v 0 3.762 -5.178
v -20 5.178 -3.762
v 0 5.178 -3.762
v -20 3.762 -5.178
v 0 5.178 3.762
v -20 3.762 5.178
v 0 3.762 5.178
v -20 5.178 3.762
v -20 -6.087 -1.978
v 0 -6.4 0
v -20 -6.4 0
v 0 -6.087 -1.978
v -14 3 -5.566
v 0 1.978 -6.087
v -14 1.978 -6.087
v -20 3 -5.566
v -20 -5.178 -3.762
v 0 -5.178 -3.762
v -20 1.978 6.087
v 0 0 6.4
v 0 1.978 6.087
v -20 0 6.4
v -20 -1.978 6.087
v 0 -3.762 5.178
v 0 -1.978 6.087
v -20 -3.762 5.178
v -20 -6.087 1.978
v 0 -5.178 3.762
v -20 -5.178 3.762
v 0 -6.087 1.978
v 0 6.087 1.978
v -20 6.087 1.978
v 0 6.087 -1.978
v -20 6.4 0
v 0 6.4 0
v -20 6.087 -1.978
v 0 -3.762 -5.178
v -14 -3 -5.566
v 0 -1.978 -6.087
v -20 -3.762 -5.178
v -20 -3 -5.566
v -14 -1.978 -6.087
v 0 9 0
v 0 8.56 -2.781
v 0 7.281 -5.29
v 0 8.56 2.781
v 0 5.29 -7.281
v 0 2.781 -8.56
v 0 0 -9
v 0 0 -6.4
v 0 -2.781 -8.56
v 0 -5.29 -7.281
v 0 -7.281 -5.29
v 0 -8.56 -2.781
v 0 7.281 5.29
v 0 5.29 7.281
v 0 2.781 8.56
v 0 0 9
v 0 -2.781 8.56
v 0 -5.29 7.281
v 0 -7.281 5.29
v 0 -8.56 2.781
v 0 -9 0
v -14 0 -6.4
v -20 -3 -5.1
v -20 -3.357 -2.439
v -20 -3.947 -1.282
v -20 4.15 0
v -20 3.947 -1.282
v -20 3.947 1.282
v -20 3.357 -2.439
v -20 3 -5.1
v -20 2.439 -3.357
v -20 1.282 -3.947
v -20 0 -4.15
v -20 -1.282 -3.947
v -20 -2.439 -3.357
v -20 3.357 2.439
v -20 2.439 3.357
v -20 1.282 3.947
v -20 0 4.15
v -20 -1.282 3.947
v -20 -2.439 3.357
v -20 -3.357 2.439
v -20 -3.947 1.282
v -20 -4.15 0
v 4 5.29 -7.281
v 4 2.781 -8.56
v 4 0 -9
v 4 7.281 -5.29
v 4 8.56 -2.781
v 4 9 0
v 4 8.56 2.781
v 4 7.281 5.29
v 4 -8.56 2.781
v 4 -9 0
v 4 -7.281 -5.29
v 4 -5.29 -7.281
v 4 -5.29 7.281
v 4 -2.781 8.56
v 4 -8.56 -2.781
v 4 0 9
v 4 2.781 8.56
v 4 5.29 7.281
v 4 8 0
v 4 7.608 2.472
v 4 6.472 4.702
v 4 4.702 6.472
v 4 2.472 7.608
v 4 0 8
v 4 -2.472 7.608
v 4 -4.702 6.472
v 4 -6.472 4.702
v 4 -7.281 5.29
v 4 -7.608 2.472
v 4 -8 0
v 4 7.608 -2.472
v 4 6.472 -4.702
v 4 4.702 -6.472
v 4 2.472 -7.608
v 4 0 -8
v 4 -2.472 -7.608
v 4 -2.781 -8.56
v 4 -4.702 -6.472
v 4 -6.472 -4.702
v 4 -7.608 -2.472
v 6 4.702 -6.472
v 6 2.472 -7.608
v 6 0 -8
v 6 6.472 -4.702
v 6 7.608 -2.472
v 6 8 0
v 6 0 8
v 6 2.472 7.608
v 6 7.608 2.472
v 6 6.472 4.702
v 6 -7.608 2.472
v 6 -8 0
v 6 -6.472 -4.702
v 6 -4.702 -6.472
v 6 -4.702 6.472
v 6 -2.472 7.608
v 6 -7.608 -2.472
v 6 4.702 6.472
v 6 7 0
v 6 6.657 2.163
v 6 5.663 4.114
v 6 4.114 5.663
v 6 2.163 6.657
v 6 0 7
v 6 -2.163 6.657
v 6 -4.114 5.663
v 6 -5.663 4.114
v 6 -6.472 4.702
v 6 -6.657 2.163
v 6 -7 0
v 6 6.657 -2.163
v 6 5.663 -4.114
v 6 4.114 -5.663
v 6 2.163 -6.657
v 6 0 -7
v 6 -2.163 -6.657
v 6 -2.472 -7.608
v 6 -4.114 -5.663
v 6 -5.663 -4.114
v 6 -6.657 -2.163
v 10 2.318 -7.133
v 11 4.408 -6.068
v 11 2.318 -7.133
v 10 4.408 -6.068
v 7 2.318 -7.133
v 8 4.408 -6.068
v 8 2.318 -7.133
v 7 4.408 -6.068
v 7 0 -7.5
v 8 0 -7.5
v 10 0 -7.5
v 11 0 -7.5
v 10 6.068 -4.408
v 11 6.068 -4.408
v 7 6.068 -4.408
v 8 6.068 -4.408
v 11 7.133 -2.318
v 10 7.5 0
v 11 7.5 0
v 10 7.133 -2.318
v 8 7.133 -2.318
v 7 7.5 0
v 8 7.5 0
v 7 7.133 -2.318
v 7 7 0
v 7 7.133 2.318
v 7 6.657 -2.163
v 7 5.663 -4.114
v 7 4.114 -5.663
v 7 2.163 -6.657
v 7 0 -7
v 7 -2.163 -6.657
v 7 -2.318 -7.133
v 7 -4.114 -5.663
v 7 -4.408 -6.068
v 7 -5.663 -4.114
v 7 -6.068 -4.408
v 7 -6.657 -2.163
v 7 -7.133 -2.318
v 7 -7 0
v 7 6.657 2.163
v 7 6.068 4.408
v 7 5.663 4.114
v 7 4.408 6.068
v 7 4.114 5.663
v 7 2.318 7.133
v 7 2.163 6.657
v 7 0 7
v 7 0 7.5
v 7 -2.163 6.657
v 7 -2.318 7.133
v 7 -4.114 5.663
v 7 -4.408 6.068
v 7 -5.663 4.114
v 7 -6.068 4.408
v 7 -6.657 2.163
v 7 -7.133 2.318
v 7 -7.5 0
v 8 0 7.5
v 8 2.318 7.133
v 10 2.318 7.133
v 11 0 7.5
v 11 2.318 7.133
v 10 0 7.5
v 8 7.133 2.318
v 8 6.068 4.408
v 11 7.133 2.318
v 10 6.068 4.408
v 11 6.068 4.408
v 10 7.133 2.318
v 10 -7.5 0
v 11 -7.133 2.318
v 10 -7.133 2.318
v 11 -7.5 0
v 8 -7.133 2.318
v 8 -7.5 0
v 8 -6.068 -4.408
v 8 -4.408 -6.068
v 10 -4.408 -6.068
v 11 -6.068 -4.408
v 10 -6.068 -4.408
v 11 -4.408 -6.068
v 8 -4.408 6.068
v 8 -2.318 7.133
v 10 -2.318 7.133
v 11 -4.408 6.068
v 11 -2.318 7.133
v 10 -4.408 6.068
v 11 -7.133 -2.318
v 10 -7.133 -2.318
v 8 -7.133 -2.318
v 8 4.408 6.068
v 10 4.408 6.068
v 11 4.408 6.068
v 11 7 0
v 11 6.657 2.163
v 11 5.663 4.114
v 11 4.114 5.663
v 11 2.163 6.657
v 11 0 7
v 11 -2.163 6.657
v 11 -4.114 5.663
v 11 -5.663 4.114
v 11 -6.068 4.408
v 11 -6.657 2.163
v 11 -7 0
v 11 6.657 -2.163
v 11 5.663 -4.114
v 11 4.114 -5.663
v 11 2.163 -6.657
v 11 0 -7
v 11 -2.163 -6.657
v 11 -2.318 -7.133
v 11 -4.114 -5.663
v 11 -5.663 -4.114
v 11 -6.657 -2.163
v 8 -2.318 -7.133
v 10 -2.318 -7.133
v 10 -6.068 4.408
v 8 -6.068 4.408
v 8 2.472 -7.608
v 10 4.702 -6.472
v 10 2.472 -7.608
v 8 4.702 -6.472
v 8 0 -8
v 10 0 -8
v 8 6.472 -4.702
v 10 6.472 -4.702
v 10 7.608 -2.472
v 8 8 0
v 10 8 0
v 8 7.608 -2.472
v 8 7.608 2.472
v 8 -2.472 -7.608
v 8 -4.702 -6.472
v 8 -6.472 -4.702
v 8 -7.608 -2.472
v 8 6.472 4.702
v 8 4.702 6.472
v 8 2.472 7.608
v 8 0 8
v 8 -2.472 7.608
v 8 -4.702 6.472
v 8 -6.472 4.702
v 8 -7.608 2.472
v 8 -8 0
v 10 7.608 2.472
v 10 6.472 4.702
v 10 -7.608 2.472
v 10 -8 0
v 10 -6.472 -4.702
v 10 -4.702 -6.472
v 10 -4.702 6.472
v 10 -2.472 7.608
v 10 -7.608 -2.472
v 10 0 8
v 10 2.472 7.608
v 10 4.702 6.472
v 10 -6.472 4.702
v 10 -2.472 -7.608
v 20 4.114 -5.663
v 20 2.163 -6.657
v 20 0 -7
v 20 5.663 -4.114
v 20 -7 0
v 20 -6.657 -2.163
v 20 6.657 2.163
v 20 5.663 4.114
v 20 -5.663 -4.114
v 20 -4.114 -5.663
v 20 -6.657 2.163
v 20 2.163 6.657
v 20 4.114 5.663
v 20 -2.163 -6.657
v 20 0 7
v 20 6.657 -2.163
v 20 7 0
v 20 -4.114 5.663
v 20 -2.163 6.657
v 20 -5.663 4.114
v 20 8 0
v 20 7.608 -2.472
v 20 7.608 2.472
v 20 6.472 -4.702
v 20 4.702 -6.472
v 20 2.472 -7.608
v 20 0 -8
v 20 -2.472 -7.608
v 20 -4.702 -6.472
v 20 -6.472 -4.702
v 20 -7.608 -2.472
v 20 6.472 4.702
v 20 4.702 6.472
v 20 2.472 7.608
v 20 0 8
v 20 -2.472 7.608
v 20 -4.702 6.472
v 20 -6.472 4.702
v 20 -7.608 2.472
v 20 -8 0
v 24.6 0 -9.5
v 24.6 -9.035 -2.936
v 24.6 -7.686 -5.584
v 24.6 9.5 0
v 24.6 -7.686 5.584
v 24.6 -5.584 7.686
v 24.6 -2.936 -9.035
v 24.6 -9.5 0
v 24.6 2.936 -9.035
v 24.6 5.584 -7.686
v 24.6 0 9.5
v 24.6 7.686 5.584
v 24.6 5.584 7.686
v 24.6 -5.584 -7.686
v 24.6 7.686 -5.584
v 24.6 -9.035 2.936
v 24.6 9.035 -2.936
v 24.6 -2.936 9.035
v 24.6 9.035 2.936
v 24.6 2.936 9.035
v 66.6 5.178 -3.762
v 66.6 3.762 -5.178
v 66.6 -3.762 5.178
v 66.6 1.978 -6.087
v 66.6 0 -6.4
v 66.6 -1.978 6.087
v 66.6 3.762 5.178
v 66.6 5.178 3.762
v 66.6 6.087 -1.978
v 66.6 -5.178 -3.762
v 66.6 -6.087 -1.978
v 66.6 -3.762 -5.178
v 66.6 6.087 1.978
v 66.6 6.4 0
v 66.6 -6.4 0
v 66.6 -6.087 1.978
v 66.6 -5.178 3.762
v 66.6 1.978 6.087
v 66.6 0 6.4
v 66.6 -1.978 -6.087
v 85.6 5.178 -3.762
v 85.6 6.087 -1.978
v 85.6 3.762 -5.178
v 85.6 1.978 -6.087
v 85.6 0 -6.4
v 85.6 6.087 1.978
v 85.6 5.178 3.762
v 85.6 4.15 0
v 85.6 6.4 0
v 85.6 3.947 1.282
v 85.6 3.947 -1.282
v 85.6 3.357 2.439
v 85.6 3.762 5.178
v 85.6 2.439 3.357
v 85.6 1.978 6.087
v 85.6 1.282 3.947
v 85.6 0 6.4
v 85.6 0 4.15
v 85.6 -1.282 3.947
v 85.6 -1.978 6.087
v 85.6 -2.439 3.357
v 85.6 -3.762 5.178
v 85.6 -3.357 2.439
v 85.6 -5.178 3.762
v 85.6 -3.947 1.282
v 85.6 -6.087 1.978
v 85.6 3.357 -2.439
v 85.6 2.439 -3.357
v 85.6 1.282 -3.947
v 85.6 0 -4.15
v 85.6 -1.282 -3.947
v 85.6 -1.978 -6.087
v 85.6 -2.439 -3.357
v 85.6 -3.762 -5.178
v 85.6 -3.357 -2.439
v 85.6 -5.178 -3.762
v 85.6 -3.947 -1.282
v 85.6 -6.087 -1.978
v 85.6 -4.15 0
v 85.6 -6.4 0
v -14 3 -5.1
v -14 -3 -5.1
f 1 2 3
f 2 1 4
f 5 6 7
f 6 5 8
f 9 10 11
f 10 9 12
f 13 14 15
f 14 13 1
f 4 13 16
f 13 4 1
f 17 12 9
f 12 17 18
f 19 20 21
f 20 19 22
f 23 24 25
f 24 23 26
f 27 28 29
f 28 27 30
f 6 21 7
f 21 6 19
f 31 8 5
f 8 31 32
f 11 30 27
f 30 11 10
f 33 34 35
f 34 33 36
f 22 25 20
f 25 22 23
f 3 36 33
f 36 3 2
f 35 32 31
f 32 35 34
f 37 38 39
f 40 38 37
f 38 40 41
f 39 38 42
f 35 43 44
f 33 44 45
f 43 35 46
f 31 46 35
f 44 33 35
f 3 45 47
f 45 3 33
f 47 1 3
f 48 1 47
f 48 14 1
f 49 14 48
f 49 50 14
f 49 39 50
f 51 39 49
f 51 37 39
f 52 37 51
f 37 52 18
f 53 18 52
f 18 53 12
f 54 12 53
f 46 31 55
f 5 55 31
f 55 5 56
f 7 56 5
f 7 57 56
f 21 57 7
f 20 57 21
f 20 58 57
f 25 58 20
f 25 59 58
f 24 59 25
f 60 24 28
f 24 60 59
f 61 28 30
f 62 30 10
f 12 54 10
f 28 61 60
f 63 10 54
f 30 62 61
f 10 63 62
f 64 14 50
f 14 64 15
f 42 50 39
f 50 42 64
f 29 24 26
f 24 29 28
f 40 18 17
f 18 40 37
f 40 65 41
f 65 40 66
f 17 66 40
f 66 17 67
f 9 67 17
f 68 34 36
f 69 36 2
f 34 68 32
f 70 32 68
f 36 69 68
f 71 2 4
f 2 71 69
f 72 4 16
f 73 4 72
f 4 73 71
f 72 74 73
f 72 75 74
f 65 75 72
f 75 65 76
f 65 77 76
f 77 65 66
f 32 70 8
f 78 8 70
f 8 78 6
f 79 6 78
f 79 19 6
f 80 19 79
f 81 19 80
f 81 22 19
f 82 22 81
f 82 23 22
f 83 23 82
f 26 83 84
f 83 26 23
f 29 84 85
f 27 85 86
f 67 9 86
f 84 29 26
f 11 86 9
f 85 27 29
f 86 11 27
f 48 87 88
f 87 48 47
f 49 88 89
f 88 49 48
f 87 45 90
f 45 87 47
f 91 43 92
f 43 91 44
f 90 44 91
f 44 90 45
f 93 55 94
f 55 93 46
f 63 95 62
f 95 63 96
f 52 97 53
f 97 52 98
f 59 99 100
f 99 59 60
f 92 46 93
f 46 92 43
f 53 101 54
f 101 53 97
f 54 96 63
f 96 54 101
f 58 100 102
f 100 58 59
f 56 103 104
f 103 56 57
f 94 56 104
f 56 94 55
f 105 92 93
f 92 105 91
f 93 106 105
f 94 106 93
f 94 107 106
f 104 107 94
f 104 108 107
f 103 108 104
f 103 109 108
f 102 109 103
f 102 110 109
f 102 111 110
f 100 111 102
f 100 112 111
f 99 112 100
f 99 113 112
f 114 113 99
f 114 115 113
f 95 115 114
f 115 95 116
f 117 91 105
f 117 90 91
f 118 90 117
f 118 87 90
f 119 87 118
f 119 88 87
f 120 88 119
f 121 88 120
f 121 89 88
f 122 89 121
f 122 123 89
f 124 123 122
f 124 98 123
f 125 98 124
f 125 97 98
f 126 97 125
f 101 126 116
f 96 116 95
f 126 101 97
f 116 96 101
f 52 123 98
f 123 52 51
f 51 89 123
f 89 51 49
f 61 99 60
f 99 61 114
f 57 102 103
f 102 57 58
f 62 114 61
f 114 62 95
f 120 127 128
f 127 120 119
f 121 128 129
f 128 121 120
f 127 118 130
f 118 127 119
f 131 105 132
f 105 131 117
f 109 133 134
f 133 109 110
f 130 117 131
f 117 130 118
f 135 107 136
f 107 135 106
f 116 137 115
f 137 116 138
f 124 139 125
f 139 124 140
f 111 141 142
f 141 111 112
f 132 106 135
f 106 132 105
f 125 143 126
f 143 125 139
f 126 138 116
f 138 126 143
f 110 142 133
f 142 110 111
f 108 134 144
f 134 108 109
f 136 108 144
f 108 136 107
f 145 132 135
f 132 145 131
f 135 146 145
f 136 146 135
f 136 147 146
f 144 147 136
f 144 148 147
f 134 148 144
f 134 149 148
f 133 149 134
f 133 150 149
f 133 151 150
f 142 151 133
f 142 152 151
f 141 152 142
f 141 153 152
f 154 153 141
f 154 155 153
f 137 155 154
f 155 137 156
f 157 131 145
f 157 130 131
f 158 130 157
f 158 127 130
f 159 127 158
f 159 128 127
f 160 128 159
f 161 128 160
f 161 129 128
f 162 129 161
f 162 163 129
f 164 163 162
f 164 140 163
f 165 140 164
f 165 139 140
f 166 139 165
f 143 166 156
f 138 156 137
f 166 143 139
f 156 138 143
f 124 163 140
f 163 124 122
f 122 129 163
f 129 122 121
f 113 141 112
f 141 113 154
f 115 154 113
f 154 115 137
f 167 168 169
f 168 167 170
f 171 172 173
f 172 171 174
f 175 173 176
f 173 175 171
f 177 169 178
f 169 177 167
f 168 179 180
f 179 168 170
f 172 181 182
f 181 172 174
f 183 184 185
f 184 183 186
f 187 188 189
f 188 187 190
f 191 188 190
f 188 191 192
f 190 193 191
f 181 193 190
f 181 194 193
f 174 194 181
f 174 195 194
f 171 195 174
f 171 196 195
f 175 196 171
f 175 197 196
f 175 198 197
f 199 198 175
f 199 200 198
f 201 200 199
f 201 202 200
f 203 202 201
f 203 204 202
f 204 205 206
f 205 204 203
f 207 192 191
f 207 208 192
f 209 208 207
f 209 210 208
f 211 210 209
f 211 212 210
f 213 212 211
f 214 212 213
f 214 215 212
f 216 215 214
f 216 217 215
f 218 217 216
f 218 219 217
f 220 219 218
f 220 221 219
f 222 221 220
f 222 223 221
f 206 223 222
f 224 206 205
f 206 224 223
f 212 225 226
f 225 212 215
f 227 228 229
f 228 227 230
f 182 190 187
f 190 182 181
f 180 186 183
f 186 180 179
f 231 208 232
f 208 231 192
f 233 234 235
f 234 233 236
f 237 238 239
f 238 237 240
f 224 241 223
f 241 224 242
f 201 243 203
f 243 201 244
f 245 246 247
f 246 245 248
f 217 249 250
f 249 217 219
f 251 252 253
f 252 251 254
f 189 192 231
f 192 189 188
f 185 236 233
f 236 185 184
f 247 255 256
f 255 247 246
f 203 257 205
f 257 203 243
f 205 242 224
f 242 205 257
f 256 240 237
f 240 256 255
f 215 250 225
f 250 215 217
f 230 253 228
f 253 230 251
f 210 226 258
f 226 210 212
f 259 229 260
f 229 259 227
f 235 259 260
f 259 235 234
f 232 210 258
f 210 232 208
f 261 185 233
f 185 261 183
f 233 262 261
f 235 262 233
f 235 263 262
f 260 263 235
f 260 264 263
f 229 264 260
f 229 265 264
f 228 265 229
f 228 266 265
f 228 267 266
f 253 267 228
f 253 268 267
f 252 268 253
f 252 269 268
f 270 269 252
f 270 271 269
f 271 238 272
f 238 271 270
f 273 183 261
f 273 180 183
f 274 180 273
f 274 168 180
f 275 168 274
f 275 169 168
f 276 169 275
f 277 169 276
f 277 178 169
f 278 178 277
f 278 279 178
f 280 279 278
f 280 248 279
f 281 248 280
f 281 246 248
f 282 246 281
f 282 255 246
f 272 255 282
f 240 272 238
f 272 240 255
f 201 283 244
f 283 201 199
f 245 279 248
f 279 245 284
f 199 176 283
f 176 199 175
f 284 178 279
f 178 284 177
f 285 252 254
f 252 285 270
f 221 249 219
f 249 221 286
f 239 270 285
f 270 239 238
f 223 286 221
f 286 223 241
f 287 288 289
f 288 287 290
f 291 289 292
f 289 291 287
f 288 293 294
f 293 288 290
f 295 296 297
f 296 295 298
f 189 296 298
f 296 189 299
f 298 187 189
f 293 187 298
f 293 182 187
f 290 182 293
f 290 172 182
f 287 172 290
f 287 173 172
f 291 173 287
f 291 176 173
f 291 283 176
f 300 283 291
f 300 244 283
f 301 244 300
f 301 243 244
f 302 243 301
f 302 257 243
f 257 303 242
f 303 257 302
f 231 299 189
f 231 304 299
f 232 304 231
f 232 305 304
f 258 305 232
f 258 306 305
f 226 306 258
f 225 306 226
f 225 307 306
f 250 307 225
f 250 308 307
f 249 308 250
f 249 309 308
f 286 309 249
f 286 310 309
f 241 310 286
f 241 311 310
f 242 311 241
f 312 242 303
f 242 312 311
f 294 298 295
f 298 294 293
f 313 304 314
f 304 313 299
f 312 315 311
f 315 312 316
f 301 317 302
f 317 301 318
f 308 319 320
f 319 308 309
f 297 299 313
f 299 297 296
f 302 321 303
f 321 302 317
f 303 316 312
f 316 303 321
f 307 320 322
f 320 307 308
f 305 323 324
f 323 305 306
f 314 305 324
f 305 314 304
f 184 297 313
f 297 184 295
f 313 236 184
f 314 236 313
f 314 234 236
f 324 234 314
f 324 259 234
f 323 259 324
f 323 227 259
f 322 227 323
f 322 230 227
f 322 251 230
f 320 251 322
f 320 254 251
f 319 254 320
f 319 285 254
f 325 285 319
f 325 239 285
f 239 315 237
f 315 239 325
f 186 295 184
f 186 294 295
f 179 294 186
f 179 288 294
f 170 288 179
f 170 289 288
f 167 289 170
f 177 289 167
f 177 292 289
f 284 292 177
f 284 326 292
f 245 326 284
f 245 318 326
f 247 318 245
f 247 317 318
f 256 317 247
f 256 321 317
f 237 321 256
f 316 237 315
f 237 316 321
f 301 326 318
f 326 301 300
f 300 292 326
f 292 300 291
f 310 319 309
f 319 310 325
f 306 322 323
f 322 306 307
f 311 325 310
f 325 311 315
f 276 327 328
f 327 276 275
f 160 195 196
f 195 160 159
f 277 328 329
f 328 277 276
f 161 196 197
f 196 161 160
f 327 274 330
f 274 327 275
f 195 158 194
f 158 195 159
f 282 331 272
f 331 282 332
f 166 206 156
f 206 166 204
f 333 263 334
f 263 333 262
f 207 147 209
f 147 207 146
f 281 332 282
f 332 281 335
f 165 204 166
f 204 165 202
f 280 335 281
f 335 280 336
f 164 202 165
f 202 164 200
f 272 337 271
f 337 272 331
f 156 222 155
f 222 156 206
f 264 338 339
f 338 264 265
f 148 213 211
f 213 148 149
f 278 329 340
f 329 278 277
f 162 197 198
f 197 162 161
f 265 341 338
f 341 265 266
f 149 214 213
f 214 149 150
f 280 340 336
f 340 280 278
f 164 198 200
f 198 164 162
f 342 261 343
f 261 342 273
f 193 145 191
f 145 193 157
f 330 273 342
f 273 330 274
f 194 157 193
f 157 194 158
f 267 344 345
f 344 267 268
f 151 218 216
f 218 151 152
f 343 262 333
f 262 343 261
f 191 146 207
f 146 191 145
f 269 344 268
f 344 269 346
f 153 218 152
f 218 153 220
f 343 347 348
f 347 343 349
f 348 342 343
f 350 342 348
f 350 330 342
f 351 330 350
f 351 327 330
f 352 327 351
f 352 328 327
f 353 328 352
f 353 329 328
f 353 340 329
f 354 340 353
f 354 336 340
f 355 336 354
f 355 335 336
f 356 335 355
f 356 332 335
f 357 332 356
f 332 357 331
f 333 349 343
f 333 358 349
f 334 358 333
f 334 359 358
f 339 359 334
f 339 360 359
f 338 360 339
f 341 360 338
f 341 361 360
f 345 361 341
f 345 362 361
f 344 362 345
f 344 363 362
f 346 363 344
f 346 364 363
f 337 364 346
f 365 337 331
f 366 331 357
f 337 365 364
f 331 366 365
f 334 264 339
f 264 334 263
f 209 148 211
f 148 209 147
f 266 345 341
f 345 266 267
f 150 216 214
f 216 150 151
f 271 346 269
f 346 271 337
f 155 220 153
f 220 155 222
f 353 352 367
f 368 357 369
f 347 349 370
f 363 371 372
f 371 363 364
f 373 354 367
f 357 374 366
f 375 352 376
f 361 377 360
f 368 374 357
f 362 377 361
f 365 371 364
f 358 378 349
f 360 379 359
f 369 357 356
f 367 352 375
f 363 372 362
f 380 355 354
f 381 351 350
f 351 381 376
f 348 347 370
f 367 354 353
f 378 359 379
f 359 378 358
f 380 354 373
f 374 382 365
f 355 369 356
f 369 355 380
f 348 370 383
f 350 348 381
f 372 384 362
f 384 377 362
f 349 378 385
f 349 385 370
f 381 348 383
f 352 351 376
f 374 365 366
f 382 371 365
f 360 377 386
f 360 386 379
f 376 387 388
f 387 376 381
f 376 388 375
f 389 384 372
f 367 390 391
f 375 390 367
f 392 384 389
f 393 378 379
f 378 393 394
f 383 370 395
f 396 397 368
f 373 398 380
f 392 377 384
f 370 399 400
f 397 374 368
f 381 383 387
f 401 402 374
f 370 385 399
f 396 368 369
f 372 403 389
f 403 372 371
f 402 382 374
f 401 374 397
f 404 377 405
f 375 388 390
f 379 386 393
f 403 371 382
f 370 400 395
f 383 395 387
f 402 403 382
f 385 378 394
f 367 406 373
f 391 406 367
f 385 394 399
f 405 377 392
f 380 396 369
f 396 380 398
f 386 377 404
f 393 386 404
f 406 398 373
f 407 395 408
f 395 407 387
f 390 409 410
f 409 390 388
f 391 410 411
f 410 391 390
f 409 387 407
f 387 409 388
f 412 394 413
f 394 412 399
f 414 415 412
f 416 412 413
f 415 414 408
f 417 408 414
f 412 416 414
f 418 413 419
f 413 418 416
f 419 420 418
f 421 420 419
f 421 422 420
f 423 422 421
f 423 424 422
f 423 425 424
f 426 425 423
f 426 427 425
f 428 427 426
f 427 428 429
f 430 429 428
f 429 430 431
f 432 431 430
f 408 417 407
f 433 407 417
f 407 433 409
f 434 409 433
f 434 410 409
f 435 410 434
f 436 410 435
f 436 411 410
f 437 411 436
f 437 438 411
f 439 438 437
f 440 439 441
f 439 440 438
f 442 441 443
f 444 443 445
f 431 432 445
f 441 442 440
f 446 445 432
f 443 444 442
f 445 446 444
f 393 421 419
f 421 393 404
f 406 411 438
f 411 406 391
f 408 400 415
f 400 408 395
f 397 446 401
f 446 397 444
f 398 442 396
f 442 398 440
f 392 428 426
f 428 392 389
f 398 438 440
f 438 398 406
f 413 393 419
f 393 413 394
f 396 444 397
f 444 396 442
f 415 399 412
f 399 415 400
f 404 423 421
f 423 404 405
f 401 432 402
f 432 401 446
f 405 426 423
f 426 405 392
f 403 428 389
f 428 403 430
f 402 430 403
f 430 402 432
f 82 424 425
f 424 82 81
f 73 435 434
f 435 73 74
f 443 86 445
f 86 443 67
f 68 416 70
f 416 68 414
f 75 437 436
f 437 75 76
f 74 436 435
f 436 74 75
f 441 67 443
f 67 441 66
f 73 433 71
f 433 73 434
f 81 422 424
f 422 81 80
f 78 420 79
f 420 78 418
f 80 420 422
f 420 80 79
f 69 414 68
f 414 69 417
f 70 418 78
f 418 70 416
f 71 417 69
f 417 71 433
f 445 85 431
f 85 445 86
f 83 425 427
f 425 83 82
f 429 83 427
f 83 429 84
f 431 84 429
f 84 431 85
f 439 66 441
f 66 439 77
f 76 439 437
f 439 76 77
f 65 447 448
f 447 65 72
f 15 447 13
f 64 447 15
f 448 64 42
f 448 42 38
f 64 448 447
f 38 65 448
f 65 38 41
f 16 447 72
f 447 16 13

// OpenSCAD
// openNSP_project, blowpipe version 1.0
// Zexuan Qiao, 2024
// under GPL license ver3
// speical thanks to Francis Wood for the extra data on the blowpipe design.

tenon1 = 20;
tenon1Diameter = 12.8;
valveHandle = 6;
valveHeight = 5.1;

main = 20; // [12:1:50]
mainDiameter =14;

shoulder1 = 4;
shoulder2 = 2;
shoulder3 = 4;
shoulder4 = 2;
shoulder1Diameter = 18;
shoulder2Diameter = 16;
shoulder3Diameter = 15;
shoulder4Diameter = 16;

taper1 = 4.6;
taper2 = 42;
taper1Diameter = 16;
taper2Diameter = 19;

tenon2 = 19;
tenon2Diameter = 12.8;

bore = 8.3;

/* [Utilities] */
// Segments, the higher the value, the smoother the surface would be.
$fn = 20;

rotate([0, 90, 0]) difference() {
  union() {
    rotate([0, -180, 0]) cylinder(h = tenon1, d = tenon1Diameter);
    translate([0, 0, 0]) cylinder(h = shoulder1, d =shoulder1Diameter);
    translate([0, 0, 4]) cylinder(h = shoulder2, d =shoulder2Diameter);
    translate([0, 0, 7]) cylinder(h = shoulder3, d =shoulder3Diameter);
    translate([0, 0, 8]) cylinder(h = shoulder4, d =shoulder4Diameter); // Decoration
    cylinder(h = main, d = mainDiameter);
    translate([0, 0, main]) cylinder(h = taper1, d1 = taper1Diameter, d2 = taper2Diameter);
    translate([0, 0, main+taper1]) cylinder(h = taper2, d1 = taper2Diameter, d2 = tenon2Diameter);
    translate([0, 0, main+taper1]) cylinder(h = taper2, d1 = taper2Diameter, d2 = tenon2Diameter);
    translate([0, 0, main+taper1+taper2]) cylinder(h = tenon2, d = tenon2Diameter);
  }
  cylinder(h = main+taper1+taper2+tenon2, d = bore);
  rotate([0, -180, 0]) cylinder(h = tenon1, d = bore);
  rotate([0, 90, 0]) translate([tenon1-valveHandle, -valveHandle/2, valveHeight]) cube(valveHandle);
}
